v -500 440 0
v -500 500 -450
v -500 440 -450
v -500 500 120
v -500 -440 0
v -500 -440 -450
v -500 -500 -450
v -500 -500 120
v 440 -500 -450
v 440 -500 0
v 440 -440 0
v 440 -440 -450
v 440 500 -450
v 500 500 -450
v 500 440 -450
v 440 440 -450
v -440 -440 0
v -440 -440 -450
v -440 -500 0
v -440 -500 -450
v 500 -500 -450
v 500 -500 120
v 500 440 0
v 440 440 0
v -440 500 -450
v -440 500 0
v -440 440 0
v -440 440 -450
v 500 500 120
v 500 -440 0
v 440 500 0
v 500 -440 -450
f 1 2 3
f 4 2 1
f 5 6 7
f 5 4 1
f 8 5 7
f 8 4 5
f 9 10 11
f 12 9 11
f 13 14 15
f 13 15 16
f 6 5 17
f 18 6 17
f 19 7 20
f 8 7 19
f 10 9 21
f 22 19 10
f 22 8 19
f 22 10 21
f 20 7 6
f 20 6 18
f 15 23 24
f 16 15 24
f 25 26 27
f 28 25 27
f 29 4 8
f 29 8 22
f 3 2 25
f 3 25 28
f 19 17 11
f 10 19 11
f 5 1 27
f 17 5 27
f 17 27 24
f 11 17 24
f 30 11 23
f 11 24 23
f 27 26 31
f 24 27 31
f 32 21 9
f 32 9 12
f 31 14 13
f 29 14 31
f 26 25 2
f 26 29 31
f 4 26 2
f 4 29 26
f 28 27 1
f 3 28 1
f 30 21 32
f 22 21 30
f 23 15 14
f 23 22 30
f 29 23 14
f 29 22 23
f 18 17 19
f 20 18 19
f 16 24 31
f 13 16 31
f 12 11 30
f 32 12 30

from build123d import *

# Parameters (mm, degrees)
F0_W            = 1000
F0_H            = 1000
F1_DEPTH        = 120
F2_W            = 60
F2_H            = 60
F3_DEPTH        = 450
F3_COPIES_COUNT = 4


# Not quite as in the source:
# - a pattern or mirror of a feature is missing from the dataset's text; its kind, count and spacing are read off the source's solid


with BuildPart() as f1:
    # F0 (on Top) → F1 (new body)
    with BuildSketch(Plane.XY):
        Rectangle(F0_W, F0_H)
    extrude(amount=F1_DEPTH)

    # F2 (on face) → F3 (join)
    with BuildSketch(Plane(origin=(0, 0, 0), x_dir=(1, 0, 0), z_dir=(0, 0, -1))):
        with Locations((-470, 470)):
            Rectangle(F2_W, F2_H)
    f3 = extrude(amount=F3_DEPTH)

    # F3_copies: F3 ×4 about axis
    f3_copies_axis = Axis((0, 0, 0), (0, 0, 1))
    for i in range(1, F3_COPIES_COUNT):
        add(f3.rotate(f3_copies_axis, i * 360 / F3_COPIES_COUNT))


solid = f1.part
